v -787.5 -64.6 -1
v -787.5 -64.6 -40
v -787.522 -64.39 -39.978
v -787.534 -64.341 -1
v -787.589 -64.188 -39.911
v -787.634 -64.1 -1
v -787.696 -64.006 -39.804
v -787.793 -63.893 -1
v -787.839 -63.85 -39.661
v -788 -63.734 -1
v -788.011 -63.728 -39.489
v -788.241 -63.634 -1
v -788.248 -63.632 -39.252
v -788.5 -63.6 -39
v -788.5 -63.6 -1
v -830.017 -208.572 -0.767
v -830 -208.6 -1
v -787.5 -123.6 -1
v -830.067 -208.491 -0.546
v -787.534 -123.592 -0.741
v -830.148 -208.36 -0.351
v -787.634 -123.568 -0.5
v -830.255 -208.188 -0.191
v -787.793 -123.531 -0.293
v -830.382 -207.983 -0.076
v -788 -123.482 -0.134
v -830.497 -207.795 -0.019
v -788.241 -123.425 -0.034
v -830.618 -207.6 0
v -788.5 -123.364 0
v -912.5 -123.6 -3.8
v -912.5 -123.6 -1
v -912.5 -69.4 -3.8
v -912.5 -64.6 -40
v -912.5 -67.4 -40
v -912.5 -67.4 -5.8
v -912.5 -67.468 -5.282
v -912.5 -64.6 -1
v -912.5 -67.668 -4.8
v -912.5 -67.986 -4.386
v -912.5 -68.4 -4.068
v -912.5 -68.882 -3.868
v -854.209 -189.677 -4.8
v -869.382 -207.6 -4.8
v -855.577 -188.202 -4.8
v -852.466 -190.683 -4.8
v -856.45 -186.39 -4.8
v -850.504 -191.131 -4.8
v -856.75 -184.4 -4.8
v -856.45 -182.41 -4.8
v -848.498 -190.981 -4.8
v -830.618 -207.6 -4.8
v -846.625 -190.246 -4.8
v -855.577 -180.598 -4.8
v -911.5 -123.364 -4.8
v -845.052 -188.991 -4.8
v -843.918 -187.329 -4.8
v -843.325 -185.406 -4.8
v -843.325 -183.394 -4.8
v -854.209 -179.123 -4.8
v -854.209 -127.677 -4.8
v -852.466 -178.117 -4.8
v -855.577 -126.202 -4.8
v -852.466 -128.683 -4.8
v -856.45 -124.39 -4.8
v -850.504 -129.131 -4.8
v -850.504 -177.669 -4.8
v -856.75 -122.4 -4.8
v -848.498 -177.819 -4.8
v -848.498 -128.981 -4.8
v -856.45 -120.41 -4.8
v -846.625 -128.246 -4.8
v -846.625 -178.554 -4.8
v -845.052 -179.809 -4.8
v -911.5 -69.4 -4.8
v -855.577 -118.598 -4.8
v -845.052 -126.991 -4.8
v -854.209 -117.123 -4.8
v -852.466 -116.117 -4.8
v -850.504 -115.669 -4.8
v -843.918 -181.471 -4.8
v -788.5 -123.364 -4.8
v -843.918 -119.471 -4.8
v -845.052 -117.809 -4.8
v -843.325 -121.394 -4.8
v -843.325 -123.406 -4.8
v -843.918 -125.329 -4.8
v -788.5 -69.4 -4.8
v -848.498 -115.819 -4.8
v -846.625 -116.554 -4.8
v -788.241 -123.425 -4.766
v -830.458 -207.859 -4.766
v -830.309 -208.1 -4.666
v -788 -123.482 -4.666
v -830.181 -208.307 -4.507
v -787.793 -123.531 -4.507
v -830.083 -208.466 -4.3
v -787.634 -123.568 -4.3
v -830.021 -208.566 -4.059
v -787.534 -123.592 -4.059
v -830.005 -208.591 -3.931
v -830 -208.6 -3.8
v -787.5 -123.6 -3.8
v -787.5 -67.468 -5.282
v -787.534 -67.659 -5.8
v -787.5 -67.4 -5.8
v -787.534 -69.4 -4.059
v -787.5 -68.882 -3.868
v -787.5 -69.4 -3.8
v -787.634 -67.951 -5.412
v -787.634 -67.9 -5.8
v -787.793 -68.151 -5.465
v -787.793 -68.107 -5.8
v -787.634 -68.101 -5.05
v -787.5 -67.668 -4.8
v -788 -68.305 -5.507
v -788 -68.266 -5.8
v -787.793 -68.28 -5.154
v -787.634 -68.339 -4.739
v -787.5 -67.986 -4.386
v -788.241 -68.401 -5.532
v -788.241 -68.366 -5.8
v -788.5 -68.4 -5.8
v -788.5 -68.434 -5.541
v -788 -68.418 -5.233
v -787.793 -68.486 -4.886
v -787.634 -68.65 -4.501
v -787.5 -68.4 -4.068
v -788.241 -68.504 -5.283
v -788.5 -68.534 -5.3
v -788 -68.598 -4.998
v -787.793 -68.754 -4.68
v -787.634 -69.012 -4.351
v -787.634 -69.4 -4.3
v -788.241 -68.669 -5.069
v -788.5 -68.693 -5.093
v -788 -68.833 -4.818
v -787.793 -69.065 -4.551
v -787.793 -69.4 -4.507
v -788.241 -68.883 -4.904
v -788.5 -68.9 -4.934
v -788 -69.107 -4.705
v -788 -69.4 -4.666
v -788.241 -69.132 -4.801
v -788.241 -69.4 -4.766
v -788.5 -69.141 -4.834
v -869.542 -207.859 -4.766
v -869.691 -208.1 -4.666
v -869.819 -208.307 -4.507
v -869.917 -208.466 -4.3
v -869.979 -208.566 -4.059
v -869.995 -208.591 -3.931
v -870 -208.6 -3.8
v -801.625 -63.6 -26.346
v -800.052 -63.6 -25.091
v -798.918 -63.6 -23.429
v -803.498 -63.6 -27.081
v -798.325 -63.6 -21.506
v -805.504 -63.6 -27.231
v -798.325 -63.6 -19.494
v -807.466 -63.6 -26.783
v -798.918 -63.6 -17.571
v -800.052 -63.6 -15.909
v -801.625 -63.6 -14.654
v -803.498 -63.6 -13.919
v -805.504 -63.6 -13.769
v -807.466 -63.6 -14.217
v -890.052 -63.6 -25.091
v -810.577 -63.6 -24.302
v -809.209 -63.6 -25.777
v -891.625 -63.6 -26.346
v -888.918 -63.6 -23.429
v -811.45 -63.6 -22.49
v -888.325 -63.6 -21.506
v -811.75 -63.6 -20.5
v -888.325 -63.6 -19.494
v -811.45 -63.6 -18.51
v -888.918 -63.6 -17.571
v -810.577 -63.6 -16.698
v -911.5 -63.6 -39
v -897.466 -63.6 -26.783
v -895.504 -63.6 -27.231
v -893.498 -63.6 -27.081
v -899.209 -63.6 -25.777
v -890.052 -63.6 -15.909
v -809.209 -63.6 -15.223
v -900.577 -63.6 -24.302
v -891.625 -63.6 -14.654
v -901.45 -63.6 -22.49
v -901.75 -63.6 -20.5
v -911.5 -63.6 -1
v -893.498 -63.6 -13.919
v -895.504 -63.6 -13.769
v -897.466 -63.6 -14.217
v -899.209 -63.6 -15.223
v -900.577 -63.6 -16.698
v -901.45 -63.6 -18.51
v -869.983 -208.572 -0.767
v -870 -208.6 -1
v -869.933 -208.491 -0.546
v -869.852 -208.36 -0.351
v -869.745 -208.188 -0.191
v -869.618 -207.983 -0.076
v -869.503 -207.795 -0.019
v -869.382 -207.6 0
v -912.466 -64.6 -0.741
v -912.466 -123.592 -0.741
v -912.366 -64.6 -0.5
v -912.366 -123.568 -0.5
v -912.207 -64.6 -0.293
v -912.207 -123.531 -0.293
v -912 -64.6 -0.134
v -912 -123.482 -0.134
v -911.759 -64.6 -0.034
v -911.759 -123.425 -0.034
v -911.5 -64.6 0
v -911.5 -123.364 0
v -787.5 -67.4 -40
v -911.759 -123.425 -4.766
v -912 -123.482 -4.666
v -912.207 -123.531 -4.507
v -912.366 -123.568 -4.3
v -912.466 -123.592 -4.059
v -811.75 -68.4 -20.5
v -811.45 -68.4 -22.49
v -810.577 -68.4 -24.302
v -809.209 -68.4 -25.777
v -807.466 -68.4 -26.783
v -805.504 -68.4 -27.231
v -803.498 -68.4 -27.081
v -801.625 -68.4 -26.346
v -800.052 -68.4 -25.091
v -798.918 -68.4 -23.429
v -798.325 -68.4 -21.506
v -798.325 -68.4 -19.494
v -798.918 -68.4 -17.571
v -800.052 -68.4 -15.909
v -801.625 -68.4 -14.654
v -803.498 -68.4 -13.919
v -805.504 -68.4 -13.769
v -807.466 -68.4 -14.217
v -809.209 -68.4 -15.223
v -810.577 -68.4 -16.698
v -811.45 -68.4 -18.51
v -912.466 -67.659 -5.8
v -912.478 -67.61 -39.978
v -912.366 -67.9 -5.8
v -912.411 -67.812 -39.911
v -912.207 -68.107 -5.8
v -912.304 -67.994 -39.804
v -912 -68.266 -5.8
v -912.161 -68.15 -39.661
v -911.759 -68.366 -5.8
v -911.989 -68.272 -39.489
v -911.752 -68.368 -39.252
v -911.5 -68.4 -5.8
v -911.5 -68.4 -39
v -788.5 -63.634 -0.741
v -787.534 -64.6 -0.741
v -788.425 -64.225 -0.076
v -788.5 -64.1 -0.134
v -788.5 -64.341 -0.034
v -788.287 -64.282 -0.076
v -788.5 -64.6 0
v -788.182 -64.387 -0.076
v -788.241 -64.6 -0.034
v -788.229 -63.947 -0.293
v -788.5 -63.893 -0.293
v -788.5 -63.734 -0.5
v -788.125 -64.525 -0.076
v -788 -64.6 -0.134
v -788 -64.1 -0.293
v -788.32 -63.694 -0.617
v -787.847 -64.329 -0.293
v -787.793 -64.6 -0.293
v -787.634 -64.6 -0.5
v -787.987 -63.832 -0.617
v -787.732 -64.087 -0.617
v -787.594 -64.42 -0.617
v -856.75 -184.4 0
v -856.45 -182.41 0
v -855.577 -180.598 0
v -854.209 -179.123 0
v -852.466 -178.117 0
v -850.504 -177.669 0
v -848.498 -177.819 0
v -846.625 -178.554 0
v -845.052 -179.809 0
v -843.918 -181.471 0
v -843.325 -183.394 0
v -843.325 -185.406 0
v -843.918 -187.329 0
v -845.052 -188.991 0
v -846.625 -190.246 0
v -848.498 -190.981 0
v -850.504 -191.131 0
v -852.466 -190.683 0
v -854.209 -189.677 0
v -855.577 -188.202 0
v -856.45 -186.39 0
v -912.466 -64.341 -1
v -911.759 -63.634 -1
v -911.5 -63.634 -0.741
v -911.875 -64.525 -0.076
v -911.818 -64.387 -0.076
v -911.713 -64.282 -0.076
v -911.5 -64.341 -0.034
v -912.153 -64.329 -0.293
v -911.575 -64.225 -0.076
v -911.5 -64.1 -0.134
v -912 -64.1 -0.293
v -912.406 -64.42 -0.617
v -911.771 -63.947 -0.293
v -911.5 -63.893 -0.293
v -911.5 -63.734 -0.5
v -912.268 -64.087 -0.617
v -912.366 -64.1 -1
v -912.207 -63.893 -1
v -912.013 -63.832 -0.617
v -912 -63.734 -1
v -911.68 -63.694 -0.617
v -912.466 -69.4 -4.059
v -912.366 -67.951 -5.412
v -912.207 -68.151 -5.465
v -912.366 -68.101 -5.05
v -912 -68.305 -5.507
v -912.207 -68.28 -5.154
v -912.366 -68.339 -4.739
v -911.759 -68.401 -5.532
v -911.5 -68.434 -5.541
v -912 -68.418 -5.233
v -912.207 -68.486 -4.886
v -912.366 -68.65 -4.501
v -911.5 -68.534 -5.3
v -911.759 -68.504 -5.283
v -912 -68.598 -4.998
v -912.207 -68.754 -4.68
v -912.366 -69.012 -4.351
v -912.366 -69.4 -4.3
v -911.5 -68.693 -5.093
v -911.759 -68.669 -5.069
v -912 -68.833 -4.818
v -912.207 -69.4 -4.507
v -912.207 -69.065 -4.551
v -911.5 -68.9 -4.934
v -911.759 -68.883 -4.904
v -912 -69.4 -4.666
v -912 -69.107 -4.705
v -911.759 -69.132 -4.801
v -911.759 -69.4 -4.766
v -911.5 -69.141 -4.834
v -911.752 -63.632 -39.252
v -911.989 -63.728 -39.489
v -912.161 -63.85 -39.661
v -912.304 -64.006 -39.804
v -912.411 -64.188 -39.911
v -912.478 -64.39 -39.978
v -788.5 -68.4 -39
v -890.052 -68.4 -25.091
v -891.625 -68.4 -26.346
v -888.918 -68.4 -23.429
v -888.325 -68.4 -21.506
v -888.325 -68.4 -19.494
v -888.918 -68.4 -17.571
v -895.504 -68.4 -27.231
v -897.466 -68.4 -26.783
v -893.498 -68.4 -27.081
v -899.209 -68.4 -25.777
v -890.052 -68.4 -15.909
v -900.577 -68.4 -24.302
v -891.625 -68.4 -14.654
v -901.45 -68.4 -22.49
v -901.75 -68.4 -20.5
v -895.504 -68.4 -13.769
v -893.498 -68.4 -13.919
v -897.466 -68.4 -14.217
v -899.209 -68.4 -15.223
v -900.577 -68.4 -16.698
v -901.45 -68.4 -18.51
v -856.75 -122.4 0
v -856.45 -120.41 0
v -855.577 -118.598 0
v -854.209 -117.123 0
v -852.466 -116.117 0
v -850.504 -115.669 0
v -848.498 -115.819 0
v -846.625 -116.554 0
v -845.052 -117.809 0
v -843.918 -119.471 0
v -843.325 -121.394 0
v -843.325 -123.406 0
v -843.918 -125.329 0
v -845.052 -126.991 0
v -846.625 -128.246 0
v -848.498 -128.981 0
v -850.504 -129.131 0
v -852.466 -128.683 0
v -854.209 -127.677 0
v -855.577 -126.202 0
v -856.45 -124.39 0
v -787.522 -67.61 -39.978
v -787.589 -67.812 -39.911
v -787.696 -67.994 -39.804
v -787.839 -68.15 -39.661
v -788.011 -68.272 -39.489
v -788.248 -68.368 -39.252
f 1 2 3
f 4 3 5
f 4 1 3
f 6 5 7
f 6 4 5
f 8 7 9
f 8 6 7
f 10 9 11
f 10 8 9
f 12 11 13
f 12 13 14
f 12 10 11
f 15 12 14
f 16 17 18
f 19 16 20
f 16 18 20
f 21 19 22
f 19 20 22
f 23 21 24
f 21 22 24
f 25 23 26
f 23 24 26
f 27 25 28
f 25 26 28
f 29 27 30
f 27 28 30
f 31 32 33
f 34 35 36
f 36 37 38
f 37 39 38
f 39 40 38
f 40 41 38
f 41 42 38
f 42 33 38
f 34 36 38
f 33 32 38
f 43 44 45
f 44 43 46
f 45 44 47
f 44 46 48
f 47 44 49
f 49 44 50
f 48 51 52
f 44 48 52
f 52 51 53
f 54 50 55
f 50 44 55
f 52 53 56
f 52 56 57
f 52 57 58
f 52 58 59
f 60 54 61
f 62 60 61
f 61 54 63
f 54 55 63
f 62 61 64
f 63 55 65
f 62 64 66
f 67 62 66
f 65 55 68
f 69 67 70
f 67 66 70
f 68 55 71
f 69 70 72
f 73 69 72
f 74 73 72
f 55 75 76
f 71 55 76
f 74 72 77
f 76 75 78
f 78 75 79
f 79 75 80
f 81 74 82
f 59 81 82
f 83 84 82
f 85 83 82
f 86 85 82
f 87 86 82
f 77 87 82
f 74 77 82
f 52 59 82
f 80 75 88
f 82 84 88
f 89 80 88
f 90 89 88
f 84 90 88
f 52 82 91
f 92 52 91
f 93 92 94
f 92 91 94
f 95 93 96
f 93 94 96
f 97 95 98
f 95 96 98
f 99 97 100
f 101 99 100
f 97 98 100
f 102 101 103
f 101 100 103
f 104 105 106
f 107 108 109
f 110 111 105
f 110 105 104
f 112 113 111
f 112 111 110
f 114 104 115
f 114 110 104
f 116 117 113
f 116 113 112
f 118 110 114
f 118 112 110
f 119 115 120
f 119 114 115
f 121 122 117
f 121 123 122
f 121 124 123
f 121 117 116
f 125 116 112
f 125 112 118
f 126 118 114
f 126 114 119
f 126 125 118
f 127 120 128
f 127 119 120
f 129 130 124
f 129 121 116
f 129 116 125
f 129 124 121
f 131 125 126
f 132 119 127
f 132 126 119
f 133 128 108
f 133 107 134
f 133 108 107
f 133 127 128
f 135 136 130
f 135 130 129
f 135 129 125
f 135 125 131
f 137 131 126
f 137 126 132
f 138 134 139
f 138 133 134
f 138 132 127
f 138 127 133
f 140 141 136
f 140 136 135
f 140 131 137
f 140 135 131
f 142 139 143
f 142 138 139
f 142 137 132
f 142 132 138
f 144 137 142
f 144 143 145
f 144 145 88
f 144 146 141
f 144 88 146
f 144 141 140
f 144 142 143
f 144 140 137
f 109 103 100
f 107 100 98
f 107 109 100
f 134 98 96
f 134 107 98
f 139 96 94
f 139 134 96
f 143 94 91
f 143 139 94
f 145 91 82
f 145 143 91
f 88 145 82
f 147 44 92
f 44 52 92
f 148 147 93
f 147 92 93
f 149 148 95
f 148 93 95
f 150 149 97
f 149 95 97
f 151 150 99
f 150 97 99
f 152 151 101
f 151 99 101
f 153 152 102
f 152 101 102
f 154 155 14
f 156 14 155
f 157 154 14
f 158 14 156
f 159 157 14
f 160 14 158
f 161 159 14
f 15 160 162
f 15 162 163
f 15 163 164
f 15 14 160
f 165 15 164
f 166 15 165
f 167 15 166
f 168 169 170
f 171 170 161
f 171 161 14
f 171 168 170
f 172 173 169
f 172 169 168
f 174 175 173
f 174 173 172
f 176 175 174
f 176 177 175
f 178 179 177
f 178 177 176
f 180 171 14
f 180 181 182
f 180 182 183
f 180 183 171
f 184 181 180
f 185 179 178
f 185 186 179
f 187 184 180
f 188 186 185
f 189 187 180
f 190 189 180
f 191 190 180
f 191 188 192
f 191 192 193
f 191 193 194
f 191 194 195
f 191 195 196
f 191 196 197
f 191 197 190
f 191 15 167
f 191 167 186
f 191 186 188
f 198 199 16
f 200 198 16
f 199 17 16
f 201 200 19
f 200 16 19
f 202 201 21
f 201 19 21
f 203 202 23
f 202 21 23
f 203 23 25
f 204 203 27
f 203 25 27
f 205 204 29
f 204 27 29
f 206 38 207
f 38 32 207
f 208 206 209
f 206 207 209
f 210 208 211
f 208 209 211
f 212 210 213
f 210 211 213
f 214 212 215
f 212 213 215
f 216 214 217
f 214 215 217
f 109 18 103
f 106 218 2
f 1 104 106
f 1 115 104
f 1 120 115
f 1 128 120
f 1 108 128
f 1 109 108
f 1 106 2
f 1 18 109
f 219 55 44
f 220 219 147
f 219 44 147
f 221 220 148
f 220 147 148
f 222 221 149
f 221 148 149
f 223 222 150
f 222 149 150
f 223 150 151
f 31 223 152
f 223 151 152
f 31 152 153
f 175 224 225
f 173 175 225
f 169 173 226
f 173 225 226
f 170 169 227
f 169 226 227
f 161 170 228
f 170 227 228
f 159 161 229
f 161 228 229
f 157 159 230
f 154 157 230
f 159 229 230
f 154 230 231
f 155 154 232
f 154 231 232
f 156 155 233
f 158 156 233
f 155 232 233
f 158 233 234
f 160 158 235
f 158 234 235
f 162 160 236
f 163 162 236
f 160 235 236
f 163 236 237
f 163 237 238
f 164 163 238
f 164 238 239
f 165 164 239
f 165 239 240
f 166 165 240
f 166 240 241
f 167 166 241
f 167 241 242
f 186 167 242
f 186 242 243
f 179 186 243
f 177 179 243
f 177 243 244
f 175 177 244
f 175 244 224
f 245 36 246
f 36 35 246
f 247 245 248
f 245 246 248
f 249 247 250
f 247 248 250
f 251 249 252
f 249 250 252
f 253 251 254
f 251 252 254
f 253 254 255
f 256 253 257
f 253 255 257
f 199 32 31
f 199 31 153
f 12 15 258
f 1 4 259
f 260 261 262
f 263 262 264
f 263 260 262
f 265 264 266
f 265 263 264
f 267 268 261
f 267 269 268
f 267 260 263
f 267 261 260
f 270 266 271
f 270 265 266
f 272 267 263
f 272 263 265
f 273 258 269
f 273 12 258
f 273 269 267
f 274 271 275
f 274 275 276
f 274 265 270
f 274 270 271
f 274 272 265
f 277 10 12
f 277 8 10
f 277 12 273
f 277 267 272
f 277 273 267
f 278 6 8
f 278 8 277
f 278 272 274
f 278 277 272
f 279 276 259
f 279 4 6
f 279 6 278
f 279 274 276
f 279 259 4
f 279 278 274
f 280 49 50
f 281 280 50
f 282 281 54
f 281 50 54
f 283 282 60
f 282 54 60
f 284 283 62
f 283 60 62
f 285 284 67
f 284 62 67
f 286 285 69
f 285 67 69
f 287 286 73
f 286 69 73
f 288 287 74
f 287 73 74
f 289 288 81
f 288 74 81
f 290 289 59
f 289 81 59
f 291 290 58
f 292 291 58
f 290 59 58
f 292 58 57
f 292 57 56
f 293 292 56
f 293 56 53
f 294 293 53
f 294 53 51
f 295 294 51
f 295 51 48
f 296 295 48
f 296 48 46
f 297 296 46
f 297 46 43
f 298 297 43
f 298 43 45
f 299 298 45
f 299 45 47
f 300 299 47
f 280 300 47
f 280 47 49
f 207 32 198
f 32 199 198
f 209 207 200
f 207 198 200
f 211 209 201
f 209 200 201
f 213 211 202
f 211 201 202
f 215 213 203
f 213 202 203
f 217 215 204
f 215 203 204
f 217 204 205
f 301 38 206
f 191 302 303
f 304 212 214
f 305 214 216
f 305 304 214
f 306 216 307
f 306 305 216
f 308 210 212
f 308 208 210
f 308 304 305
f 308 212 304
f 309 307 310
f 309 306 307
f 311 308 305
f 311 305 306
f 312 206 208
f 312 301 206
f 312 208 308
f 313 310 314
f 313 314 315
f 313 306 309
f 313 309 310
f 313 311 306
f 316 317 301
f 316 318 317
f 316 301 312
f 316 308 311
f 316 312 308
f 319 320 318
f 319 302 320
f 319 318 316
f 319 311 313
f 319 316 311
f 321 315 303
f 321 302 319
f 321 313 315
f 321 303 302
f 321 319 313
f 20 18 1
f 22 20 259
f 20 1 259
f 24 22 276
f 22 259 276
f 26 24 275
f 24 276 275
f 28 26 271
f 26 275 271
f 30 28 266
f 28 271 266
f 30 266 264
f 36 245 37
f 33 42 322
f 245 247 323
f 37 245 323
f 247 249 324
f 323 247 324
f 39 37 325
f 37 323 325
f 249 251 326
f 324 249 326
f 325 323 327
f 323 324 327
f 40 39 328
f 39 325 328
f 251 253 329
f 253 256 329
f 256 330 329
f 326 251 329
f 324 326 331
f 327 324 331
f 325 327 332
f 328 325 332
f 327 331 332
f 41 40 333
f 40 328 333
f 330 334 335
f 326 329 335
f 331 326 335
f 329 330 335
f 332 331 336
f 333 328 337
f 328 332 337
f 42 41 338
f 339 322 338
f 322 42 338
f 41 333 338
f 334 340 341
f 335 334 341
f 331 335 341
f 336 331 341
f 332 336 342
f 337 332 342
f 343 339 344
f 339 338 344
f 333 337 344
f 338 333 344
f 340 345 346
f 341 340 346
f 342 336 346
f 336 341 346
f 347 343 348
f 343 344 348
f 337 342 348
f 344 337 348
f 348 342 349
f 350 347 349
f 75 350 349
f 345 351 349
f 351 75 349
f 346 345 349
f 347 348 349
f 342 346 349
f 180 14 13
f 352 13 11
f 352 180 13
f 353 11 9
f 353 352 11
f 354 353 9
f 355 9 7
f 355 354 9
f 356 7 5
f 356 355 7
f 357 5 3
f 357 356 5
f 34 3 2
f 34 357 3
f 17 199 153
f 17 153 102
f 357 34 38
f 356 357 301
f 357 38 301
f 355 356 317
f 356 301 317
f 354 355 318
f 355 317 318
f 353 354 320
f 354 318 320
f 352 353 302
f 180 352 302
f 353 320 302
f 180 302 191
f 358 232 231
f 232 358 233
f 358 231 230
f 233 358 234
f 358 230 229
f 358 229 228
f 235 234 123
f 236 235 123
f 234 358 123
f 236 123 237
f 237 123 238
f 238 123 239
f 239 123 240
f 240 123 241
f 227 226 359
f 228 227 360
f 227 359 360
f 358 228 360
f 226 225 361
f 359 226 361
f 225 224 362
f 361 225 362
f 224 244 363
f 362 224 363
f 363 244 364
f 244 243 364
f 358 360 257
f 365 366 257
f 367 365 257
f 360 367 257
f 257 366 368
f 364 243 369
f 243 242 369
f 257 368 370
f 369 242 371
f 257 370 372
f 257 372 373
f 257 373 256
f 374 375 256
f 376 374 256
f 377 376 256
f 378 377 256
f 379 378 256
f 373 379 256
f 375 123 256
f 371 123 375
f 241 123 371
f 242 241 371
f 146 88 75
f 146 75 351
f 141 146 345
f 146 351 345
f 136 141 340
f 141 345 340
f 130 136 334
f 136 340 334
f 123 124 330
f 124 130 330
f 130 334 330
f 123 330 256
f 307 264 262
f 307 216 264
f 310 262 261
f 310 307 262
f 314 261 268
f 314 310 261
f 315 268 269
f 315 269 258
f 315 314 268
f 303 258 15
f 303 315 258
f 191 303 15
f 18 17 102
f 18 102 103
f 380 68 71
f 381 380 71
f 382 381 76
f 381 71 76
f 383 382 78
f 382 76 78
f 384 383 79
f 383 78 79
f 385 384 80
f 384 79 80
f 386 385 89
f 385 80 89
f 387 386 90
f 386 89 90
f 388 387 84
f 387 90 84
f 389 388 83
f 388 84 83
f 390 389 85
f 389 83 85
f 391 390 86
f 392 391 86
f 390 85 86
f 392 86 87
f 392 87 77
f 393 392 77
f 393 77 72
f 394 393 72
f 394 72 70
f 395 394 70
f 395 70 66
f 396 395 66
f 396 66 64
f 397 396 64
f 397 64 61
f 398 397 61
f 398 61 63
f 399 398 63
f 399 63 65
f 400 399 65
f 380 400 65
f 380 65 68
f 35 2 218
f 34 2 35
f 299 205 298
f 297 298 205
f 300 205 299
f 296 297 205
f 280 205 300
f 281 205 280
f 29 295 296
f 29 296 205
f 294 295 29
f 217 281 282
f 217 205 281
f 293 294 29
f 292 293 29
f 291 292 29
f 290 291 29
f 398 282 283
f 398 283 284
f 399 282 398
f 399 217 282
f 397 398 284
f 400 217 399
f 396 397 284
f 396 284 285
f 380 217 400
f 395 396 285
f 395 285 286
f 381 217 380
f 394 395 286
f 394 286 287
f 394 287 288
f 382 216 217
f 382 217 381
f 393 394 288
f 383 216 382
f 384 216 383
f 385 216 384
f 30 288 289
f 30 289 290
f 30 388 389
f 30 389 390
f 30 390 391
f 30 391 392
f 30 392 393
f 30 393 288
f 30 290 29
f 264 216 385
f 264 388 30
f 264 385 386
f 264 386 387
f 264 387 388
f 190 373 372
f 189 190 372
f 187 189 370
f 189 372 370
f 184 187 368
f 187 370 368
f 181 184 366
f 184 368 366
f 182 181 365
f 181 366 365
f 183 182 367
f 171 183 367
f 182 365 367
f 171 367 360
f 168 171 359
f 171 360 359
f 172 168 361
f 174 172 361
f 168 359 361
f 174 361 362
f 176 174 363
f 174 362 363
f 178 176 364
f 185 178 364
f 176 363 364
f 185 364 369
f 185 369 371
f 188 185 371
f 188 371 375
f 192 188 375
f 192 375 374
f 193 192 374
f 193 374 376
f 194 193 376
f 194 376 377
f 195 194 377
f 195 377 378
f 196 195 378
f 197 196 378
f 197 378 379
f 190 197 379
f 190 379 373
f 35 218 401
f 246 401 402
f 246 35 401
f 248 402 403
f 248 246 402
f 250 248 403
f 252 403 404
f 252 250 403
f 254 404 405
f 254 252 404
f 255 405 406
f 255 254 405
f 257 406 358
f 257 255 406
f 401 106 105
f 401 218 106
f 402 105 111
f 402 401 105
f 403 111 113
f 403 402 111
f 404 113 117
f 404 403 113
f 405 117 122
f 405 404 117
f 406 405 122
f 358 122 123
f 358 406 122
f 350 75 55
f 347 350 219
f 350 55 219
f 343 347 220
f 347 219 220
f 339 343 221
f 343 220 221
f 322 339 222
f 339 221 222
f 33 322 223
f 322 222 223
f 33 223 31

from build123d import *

# Parameters (mm, degrees)
SALIENTE_EXTRUIR1_DEPTH       = 4.8
CROQUIS2_W                    = 125
CROQUIS2_H                    = 4.8
SALIENTE_EXTRUIR2_DEPTH       = 35.2
REDONDEO1_R                   = 1
TALADRO_DE_MARGEN_PARA_M121_D = 13.5
TALADRO_DE_MARGEN_PARA_M122_D = 13.5


with BuildPart() as part:
    # Croquis1 → Saliente-Extruir1 (new body)
    with BuildSketch(Plane.XY):
        Polygon((-912.5, -63.6), (-912.5, -123.6), (-870, -208.6), (-830, -208.6), (-787.5, -123.6), (-787.5, -63.6), align=None)
    extrude(amount=-SALIENTE_EXTRUIR1_DEPTH)

    # Croquis2 → Saliente-Extruir2 (add)
    with BuildSketch(Plane(origin=(0, 0, -4.8), x_dir=(-1, 0, 0), z_dir=(0, 0, -1))):
        with Locations((850, -66)):
            Rectangle(CROQUIS2_W, CROQUIS2_H)
    extrude(amount=SALIENTE_EXTRUIR2_DEPTH)

    # Redondeo1
    redondeo1_edges = [part.edges().sort_by_distance(p)[0] for p in [
        (-912.5, -63.6, -20),
        (-787.5, -63.6, -20),
        (-912.5, -96, -4.8),
        (-891.25, -166.1, -4.8),
        (-850, -68.4, -4.8),
        (-787.5, -68.4, -22.4),
        (-912.5, -68.4, -22.4),
        (-850, -68.4, -40),
        (-850, -63.6, -40),
        (-850, -208.6, -4.8),
        (-808.75, -166.1, -4.8),
        (-850, -208.6, 0),
        (-891.25, -166.1, 0),
        (-912.5, -93.6, 0),
        (-850, -63.6, 0),
        (-787.5, -93.6, 0),
        (-808.75, -166.1, 0),
        (-787.5, -96, -4.8),
    ]]
    fillet(redondeo1_edges, radius=REDONDEO1_R)

    # Taladro de margen para M121 (through all)
    with Locations(Plane(origin=(0, -63.6, 0), x_dir=(1, 0, 0), z_dir=(0, 1, 0))):
        with Locations((-895, 20.5), (-805, 20.5)):
            Hole(TALADRO_DE_MARGEN_PARA_M121_D / 2)

    # Taladro de margen para M122 (through all)
    with Locations(Plane.XY):
        with Locations((-850, -122.4), (-850, -184.4)):
            Hole(TALADRO_DE_MARGEN_PARA_M122_D / 2)


solid = part.part
